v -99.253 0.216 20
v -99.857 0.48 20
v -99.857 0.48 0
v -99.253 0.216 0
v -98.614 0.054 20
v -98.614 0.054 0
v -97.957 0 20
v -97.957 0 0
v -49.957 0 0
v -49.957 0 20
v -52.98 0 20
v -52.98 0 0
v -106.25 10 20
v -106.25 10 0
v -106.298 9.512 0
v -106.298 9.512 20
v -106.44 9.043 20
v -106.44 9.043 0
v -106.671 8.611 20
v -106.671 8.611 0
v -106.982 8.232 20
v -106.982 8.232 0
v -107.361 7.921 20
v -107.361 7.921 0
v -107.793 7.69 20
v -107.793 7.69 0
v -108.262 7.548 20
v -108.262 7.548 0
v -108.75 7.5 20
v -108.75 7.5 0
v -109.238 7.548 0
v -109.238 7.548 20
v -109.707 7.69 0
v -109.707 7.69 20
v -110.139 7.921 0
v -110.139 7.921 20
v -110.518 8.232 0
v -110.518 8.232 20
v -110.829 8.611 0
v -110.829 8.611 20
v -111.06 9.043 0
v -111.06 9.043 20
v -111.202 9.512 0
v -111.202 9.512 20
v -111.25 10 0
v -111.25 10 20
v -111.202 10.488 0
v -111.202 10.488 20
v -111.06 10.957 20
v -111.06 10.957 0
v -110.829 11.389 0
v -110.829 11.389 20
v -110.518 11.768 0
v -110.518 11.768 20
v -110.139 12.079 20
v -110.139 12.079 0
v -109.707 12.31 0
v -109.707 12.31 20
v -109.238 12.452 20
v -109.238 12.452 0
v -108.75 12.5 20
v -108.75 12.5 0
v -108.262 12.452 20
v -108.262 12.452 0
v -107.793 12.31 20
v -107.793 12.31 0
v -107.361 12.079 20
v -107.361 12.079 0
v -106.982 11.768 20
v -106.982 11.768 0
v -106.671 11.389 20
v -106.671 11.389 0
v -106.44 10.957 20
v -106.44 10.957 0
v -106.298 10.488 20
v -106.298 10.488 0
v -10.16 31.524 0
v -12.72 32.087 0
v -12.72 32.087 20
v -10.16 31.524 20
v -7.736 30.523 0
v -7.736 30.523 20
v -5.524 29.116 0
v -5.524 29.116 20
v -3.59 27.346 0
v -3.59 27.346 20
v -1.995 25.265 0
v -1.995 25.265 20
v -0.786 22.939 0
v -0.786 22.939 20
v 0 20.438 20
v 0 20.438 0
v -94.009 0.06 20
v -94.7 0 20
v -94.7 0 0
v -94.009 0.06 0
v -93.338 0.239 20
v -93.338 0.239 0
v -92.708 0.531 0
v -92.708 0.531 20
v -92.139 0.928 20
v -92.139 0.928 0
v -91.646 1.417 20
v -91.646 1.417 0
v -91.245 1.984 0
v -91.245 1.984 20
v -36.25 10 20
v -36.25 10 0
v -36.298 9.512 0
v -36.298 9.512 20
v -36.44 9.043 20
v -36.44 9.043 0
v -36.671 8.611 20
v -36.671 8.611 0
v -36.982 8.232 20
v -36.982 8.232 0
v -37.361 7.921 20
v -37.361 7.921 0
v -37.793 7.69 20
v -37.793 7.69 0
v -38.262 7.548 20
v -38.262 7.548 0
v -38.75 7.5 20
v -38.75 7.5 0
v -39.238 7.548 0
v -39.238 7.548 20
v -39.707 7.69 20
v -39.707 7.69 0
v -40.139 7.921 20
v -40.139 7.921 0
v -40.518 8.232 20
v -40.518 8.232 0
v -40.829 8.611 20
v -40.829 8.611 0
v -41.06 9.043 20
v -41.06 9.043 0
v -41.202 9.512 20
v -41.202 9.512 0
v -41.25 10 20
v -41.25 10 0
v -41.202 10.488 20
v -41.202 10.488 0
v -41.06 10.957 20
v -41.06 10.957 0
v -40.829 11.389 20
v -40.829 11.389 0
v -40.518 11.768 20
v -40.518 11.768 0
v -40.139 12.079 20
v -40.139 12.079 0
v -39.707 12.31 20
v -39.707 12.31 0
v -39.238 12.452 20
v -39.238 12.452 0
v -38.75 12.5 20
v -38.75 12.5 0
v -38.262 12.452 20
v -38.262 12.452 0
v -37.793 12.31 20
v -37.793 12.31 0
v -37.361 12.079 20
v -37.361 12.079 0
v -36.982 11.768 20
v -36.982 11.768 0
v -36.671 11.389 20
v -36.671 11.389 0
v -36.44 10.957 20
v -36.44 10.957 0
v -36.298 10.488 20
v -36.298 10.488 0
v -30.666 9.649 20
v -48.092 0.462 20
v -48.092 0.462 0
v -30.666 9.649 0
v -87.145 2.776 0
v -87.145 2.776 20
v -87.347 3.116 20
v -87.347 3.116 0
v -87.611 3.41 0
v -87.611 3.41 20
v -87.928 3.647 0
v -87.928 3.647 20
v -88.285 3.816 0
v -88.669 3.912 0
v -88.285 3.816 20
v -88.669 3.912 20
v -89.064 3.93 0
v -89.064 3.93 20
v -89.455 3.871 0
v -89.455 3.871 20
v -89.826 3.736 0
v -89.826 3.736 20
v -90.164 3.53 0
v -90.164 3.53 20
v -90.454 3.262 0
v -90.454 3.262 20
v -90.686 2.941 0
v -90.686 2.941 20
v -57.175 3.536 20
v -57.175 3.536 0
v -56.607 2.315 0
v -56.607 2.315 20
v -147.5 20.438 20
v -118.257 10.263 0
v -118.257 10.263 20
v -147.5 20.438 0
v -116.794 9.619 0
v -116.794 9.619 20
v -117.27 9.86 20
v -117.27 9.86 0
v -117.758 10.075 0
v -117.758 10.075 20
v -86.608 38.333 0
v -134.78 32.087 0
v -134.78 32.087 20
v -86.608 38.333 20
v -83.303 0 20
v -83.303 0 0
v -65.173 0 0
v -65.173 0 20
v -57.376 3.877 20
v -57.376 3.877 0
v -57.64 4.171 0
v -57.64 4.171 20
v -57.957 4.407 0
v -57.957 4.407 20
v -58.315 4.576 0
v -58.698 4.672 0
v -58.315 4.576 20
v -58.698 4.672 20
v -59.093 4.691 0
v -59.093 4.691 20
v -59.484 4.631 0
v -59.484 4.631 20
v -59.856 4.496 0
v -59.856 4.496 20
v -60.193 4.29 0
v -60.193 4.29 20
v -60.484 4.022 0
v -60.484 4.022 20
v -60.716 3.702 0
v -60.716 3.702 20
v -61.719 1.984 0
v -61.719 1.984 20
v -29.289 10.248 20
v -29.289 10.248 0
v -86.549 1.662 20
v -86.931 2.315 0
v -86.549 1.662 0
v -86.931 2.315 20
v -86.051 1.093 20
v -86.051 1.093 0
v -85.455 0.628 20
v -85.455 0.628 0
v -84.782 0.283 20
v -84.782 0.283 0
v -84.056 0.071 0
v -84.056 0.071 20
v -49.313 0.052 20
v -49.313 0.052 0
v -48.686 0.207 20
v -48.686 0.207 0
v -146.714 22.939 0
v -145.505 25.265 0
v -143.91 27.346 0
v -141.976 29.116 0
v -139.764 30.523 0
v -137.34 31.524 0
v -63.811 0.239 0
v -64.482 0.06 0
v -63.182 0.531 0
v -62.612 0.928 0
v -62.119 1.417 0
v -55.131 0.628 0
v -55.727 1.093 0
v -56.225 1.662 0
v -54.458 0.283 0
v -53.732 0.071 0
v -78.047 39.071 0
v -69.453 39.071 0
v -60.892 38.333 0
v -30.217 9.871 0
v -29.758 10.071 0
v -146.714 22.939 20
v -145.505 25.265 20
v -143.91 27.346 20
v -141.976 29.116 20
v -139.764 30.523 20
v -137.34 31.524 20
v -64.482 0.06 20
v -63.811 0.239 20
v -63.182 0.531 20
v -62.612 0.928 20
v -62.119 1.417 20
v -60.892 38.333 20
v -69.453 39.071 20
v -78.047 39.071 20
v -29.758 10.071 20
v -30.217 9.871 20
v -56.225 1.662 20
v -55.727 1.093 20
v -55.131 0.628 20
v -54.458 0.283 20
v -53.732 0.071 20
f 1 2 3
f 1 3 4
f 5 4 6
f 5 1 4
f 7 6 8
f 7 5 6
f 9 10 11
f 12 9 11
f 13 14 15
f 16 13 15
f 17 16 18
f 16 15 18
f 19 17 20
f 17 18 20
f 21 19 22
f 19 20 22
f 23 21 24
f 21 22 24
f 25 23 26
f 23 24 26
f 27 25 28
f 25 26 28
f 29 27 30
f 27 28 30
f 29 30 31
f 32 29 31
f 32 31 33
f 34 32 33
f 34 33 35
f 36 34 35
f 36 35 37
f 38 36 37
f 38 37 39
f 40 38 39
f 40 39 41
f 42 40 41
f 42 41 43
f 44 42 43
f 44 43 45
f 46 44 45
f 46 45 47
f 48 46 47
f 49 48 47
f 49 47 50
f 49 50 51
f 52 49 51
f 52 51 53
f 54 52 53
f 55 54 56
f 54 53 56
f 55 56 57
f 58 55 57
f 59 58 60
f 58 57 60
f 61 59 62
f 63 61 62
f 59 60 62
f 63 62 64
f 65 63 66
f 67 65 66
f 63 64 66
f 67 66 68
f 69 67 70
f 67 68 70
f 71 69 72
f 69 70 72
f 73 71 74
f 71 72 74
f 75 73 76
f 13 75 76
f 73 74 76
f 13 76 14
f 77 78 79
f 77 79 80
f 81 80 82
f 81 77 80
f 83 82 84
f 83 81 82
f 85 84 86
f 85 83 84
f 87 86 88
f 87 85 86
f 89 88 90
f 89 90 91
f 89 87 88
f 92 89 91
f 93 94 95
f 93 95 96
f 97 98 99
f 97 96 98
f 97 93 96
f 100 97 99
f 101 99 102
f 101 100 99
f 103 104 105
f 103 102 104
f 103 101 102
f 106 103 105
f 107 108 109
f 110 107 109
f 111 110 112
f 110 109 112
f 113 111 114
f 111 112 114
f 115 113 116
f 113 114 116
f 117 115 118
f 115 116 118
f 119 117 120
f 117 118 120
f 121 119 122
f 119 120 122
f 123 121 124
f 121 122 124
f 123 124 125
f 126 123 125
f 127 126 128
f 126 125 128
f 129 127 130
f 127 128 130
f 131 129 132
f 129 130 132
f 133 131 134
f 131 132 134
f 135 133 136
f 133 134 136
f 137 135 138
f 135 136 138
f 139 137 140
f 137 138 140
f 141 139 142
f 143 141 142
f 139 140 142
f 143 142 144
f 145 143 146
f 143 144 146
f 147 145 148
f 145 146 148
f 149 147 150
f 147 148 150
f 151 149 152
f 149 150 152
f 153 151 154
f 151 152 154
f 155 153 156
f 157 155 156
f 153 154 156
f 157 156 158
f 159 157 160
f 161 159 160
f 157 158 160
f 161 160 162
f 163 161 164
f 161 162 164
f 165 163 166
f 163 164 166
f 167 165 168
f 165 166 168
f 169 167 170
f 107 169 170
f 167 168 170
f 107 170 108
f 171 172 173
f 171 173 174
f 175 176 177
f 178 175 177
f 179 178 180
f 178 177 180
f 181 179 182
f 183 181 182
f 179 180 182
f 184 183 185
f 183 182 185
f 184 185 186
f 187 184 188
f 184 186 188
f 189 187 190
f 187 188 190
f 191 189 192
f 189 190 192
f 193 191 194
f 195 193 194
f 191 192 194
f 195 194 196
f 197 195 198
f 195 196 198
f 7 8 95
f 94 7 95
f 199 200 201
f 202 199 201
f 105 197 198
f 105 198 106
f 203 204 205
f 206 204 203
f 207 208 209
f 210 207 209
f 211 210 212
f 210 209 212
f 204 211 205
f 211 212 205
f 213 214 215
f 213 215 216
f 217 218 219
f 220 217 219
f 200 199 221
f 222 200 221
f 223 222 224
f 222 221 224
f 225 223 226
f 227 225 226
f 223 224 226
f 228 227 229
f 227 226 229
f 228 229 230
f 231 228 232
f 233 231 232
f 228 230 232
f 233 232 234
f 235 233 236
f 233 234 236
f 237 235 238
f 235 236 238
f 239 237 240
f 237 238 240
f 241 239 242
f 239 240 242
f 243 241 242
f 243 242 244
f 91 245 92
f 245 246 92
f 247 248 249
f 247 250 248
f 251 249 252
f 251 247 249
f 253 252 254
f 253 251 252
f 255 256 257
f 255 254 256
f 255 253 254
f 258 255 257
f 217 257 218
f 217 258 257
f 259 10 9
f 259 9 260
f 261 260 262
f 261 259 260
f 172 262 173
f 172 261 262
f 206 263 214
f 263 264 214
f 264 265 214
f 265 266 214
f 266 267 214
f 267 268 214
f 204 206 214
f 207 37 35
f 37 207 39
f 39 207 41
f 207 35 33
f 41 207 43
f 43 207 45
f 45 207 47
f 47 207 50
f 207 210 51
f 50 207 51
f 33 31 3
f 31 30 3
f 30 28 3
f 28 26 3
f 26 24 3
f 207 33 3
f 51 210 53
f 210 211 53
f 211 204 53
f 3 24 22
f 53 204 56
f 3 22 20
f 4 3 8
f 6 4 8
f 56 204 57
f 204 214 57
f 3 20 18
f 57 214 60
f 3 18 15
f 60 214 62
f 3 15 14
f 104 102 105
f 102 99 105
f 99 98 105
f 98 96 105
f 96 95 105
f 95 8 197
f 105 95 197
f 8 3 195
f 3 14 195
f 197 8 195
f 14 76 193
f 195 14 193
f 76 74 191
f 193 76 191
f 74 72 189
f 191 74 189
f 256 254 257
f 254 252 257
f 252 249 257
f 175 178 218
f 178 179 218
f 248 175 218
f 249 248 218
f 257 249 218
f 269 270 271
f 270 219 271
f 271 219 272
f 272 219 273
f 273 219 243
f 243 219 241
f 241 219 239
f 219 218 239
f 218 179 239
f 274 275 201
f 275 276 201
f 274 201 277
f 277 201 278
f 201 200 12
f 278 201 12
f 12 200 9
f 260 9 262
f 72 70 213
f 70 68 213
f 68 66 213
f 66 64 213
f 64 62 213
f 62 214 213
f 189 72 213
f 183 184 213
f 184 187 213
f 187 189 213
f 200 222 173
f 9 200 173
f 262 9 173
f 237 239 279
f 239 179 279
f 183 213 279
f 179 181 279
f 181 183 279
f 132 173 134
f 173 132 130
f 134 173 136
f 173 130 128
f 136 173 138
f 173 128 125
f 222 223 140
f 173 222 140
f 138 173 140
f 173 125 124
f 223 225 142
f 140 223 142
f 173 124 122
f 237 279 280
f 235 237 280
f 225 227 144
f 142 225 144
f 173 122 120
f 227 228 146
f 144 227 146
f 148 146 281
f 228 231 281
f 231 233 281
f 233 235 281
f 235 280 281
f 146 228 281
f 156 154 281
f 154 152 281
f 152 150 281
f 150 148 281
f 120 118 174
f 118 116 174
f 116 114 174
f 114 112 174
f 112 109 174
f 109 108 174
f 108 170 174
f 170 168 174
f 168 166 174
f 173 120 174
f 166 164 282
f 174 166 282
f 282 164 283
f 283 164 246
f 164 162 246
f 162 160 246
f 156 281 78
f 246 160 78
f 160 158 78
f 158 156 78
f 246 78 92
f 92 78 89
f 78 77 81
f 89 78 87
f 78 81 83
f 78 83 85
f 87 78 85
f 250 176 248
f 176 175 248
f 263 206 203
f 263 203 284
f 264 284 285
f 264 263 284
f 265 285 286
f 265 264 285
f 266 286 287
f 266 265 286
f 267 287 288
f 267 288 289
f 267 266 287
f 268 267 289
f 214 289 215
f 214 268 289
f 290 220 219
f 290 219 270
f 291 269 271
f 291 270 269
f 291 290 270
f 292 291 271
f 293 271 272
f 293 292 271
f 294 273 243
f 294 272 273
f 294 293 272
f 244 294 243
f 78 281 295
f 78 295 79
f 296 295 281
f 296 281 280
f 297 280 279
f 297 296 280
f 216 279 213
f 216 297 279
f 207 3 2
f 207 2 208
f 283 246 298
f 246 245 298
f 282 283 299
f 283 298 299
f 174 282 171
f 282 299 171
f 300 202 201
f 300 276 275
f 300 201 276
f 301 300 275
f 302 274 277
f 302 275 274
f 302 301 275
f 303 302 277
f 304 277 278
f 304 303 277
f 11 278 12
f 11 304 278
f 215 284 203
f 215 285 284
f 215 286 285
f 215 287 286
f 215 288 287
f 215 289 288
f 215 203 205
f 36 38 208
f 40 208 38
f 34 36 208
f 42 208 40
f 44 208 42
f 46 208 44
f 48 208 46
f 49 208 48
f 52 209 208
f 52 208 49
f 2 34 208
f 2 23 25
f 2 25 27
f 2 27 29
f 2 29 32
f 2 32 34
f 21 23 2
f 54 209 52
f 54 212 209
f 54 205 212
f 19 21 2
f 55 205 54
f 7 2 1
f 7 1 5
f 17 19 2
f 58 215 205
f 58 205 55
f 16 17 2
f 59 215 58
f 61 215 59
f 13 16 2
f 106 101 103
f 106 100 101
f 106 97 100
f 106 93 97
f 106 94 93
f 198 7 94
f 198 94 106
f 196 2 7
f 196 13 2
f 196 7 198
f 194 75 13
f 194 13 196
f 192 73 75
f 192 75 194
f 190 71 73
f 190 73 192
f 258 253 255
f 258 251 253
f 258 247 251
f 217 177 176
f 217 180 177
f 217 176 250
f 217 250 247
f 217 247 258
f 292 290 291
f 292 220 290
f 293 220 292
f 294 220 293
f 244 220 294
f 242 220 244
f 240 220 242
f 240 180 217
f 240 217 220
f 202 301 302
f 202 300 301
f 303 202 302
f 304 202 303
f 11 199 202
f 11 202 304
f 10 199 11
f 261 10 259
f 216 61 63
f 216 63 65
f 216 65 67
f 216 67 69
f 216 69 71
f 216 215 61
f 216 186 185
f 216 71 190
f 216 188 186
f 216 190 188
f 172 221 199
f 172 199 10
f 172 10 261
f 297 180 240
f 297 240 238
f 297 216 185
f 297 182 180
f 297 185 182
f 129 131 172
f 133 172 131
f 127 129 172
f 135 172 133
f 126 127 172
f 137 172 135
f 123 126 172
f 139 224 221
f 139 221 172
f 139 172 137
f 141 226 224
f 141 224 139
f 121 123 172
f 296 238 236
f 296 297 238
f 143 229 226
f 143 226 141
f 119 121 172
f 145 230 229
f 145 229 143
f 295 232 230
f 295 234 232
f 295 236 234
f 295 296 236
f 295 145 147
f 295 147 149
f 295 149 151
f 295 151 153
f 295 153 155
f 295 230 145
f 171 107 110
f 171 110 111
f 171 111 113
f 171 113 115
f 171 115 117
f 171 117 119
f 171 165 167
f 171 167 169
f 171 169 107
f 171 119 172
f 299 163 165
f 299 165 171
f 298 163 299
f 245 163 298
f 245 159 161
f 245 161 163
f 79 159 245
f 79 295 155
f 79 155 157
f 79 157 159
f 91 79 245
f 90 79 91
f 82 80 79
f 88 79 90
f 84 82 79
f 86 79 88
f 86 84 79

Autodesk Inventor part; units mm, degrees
ref_plane "YZ Plane" through (0, 0, 0) normal (1, 0, 0) x (0, 1, 0)
ref_plane "XZ Plane" through (0, 0, 0) normal (0, 1, 0) x (-1, 0, 0)
ref_plane "XY Plane" through (0, 0, 0) normal (0, 0, 1) x (1, 0, 0)
sketch "Sketch1" plane through (0, 0, 0) normal (0, 0, 1) x (1, 0, 0)
  line L0 (0, 0) -> (-48.9676, 0)
  line L1 (-147.5, 0) -> (-147.5, 20.4375)
  line L2 (-147.5, 40) -> (-73.75, 40)
  line L3 (0, 40) -> (0, 30.4375)
  line L4 (-108.75, 10) -> (-38.75, 10)
  line L5 (-108.75, 10) -> (-117.5, 10)
  line L6 (-38.75, 10) -> (-30, 10)
  line L7 (-98.9676, 0) -> (-92.4032, 0)
  line L8 (-147.5, 0) -> (-98.9676, 0)
  line L9 (-48.9676, 0) -> (0, 0)
  line L10 (-147.5, 10) -> (-117.5, 10)
  line L11 (0, 10) -> (-30, 10)
  line L12 (-98.9676, 0) -> (-117.5, 10)
  line L13 (-48.9676, 0) -> (-30, 10)
  line L14 (-117.5, 10) -> (-147.5, 10)
  line L15 (-30, 10) -> (0, 10)
  circle A0 centre (-108.75, 10) radius 2.5
  circle A1 centre (-38.75, 10) radius 2.5
  line L16 (-147.5, 10) -> (-147.5, 20.4375)
  line L17 (-117.5, 10) -> (-147.5, 20.4375)
  line L18 (0, 10) -> (0, 20.4375)
  line L19 (0, 20.4375) -> (-147.5, 20.4375)
  line L20 (-30, 10) -> (0, 20.4375)
  line L21 (-147.5, 20.4375) -> (-147.5, 30.4375)
  line L22 (-147.5, 30.4375) -> (-73.75, 40)
  line L23 (0, 20.4375) -> (0, 30.4375)
  line L24 (-73.75, 40) -> (0, 30.4375)
  line L25 (0, 20.4375) -> (0, 0)
  line L26 (0, 30.4375) -> (0, 20.4375)
  line L27 (-147.5, 30.4375) -> (-147.5, 40)
  line L28 (-147.5, 20.4375) -> (-147.5, 30.4375)
  line L29 (-73.75, 40) -> (0, 40)
  line L30 (-88.7871, 0) -> (-58.7871, 0)
  line L31 (-88.7575, 0) -> (-58.7871, 0)
  line L32 (-88.7575, 0) -> (-88.7575, 6.2461)
  line L33 (-58.7871, 0) -> (-58.7871, 7.0063)
  line L34 (-58.7871, 7.0063) -> (-62.8766, 0)
  line L35 (-58.7871, 7.0063) -> (-55.532, 0)
  line L36 (-88.7575, 6.2461) -> (-85.8556, 0)
  line L37 (-88.7575, 6.2461) -> (-92.4032, 0)
  line L38 (-58.7871, 0) -> (-55.532, 0)
  line L39 (-92.4032, 0) -> (-147.5, 0)
  line L40 (-48.9676, 0) -> (-55.532, 0)
  line L41 (-55.532, 0) -> (-92.4032, 0)
  line L42 (-92.4032, 0) -> (-88.7575, 0)
  line L43 (-55.532, 0) -> (-48.9676, 0)
  point P0 (-73.75, 0)
  point P1 (-85.8556, 0)
  dimension "d0" = 147.5
  dimension "d1" = 40
  dimension "d2" = 70
  dimension "d3" = 10
  dimension "d4" = 50
  dimension "d5" = 30
  dimension "d6" = 30
  dimension "d7" = 5
  dimension "d8" = 5
  dimension "d9" = 10
  dimension "d10" = 30
extrude "Extrusion2" add sketch "Sketch1" along normal blind 20 contours L40 L35 L34 L30 L36 L37 L7 L12 L5 A0 L4 A1 L6 L13 | L6 A1 L4 A0 L5 L17 L19 L20 | L19 L21 L22 L24 L23
fillet "Fillet5" radius 100 1 edges at (-73.75, 40, 10)
fillet "Fillet6" radius 15 2 edges at (0, 30.4375, 10) (-147.5, 30.4375, 10)
fillet "Fillet7" radius 10 2 edges at (-117.5, 10, 10) (-30, 10, 10)
fillet "Fillet8" radius 4 6 edges at (-98.9676, 0, 10) (-92.4032, 0, 10) (-55.532, 0, 10) (-48.9676, 0, 10) (-85.8556, 0, 10) (-62.8766, 0, 10)
fillet "Fillet9" radius 2 2 edges at (-88.7575, 6.2461, 10) (-58.7871, 7.0063, 10)
properties part number "bumper" material "Polystyrene, Expanded"
